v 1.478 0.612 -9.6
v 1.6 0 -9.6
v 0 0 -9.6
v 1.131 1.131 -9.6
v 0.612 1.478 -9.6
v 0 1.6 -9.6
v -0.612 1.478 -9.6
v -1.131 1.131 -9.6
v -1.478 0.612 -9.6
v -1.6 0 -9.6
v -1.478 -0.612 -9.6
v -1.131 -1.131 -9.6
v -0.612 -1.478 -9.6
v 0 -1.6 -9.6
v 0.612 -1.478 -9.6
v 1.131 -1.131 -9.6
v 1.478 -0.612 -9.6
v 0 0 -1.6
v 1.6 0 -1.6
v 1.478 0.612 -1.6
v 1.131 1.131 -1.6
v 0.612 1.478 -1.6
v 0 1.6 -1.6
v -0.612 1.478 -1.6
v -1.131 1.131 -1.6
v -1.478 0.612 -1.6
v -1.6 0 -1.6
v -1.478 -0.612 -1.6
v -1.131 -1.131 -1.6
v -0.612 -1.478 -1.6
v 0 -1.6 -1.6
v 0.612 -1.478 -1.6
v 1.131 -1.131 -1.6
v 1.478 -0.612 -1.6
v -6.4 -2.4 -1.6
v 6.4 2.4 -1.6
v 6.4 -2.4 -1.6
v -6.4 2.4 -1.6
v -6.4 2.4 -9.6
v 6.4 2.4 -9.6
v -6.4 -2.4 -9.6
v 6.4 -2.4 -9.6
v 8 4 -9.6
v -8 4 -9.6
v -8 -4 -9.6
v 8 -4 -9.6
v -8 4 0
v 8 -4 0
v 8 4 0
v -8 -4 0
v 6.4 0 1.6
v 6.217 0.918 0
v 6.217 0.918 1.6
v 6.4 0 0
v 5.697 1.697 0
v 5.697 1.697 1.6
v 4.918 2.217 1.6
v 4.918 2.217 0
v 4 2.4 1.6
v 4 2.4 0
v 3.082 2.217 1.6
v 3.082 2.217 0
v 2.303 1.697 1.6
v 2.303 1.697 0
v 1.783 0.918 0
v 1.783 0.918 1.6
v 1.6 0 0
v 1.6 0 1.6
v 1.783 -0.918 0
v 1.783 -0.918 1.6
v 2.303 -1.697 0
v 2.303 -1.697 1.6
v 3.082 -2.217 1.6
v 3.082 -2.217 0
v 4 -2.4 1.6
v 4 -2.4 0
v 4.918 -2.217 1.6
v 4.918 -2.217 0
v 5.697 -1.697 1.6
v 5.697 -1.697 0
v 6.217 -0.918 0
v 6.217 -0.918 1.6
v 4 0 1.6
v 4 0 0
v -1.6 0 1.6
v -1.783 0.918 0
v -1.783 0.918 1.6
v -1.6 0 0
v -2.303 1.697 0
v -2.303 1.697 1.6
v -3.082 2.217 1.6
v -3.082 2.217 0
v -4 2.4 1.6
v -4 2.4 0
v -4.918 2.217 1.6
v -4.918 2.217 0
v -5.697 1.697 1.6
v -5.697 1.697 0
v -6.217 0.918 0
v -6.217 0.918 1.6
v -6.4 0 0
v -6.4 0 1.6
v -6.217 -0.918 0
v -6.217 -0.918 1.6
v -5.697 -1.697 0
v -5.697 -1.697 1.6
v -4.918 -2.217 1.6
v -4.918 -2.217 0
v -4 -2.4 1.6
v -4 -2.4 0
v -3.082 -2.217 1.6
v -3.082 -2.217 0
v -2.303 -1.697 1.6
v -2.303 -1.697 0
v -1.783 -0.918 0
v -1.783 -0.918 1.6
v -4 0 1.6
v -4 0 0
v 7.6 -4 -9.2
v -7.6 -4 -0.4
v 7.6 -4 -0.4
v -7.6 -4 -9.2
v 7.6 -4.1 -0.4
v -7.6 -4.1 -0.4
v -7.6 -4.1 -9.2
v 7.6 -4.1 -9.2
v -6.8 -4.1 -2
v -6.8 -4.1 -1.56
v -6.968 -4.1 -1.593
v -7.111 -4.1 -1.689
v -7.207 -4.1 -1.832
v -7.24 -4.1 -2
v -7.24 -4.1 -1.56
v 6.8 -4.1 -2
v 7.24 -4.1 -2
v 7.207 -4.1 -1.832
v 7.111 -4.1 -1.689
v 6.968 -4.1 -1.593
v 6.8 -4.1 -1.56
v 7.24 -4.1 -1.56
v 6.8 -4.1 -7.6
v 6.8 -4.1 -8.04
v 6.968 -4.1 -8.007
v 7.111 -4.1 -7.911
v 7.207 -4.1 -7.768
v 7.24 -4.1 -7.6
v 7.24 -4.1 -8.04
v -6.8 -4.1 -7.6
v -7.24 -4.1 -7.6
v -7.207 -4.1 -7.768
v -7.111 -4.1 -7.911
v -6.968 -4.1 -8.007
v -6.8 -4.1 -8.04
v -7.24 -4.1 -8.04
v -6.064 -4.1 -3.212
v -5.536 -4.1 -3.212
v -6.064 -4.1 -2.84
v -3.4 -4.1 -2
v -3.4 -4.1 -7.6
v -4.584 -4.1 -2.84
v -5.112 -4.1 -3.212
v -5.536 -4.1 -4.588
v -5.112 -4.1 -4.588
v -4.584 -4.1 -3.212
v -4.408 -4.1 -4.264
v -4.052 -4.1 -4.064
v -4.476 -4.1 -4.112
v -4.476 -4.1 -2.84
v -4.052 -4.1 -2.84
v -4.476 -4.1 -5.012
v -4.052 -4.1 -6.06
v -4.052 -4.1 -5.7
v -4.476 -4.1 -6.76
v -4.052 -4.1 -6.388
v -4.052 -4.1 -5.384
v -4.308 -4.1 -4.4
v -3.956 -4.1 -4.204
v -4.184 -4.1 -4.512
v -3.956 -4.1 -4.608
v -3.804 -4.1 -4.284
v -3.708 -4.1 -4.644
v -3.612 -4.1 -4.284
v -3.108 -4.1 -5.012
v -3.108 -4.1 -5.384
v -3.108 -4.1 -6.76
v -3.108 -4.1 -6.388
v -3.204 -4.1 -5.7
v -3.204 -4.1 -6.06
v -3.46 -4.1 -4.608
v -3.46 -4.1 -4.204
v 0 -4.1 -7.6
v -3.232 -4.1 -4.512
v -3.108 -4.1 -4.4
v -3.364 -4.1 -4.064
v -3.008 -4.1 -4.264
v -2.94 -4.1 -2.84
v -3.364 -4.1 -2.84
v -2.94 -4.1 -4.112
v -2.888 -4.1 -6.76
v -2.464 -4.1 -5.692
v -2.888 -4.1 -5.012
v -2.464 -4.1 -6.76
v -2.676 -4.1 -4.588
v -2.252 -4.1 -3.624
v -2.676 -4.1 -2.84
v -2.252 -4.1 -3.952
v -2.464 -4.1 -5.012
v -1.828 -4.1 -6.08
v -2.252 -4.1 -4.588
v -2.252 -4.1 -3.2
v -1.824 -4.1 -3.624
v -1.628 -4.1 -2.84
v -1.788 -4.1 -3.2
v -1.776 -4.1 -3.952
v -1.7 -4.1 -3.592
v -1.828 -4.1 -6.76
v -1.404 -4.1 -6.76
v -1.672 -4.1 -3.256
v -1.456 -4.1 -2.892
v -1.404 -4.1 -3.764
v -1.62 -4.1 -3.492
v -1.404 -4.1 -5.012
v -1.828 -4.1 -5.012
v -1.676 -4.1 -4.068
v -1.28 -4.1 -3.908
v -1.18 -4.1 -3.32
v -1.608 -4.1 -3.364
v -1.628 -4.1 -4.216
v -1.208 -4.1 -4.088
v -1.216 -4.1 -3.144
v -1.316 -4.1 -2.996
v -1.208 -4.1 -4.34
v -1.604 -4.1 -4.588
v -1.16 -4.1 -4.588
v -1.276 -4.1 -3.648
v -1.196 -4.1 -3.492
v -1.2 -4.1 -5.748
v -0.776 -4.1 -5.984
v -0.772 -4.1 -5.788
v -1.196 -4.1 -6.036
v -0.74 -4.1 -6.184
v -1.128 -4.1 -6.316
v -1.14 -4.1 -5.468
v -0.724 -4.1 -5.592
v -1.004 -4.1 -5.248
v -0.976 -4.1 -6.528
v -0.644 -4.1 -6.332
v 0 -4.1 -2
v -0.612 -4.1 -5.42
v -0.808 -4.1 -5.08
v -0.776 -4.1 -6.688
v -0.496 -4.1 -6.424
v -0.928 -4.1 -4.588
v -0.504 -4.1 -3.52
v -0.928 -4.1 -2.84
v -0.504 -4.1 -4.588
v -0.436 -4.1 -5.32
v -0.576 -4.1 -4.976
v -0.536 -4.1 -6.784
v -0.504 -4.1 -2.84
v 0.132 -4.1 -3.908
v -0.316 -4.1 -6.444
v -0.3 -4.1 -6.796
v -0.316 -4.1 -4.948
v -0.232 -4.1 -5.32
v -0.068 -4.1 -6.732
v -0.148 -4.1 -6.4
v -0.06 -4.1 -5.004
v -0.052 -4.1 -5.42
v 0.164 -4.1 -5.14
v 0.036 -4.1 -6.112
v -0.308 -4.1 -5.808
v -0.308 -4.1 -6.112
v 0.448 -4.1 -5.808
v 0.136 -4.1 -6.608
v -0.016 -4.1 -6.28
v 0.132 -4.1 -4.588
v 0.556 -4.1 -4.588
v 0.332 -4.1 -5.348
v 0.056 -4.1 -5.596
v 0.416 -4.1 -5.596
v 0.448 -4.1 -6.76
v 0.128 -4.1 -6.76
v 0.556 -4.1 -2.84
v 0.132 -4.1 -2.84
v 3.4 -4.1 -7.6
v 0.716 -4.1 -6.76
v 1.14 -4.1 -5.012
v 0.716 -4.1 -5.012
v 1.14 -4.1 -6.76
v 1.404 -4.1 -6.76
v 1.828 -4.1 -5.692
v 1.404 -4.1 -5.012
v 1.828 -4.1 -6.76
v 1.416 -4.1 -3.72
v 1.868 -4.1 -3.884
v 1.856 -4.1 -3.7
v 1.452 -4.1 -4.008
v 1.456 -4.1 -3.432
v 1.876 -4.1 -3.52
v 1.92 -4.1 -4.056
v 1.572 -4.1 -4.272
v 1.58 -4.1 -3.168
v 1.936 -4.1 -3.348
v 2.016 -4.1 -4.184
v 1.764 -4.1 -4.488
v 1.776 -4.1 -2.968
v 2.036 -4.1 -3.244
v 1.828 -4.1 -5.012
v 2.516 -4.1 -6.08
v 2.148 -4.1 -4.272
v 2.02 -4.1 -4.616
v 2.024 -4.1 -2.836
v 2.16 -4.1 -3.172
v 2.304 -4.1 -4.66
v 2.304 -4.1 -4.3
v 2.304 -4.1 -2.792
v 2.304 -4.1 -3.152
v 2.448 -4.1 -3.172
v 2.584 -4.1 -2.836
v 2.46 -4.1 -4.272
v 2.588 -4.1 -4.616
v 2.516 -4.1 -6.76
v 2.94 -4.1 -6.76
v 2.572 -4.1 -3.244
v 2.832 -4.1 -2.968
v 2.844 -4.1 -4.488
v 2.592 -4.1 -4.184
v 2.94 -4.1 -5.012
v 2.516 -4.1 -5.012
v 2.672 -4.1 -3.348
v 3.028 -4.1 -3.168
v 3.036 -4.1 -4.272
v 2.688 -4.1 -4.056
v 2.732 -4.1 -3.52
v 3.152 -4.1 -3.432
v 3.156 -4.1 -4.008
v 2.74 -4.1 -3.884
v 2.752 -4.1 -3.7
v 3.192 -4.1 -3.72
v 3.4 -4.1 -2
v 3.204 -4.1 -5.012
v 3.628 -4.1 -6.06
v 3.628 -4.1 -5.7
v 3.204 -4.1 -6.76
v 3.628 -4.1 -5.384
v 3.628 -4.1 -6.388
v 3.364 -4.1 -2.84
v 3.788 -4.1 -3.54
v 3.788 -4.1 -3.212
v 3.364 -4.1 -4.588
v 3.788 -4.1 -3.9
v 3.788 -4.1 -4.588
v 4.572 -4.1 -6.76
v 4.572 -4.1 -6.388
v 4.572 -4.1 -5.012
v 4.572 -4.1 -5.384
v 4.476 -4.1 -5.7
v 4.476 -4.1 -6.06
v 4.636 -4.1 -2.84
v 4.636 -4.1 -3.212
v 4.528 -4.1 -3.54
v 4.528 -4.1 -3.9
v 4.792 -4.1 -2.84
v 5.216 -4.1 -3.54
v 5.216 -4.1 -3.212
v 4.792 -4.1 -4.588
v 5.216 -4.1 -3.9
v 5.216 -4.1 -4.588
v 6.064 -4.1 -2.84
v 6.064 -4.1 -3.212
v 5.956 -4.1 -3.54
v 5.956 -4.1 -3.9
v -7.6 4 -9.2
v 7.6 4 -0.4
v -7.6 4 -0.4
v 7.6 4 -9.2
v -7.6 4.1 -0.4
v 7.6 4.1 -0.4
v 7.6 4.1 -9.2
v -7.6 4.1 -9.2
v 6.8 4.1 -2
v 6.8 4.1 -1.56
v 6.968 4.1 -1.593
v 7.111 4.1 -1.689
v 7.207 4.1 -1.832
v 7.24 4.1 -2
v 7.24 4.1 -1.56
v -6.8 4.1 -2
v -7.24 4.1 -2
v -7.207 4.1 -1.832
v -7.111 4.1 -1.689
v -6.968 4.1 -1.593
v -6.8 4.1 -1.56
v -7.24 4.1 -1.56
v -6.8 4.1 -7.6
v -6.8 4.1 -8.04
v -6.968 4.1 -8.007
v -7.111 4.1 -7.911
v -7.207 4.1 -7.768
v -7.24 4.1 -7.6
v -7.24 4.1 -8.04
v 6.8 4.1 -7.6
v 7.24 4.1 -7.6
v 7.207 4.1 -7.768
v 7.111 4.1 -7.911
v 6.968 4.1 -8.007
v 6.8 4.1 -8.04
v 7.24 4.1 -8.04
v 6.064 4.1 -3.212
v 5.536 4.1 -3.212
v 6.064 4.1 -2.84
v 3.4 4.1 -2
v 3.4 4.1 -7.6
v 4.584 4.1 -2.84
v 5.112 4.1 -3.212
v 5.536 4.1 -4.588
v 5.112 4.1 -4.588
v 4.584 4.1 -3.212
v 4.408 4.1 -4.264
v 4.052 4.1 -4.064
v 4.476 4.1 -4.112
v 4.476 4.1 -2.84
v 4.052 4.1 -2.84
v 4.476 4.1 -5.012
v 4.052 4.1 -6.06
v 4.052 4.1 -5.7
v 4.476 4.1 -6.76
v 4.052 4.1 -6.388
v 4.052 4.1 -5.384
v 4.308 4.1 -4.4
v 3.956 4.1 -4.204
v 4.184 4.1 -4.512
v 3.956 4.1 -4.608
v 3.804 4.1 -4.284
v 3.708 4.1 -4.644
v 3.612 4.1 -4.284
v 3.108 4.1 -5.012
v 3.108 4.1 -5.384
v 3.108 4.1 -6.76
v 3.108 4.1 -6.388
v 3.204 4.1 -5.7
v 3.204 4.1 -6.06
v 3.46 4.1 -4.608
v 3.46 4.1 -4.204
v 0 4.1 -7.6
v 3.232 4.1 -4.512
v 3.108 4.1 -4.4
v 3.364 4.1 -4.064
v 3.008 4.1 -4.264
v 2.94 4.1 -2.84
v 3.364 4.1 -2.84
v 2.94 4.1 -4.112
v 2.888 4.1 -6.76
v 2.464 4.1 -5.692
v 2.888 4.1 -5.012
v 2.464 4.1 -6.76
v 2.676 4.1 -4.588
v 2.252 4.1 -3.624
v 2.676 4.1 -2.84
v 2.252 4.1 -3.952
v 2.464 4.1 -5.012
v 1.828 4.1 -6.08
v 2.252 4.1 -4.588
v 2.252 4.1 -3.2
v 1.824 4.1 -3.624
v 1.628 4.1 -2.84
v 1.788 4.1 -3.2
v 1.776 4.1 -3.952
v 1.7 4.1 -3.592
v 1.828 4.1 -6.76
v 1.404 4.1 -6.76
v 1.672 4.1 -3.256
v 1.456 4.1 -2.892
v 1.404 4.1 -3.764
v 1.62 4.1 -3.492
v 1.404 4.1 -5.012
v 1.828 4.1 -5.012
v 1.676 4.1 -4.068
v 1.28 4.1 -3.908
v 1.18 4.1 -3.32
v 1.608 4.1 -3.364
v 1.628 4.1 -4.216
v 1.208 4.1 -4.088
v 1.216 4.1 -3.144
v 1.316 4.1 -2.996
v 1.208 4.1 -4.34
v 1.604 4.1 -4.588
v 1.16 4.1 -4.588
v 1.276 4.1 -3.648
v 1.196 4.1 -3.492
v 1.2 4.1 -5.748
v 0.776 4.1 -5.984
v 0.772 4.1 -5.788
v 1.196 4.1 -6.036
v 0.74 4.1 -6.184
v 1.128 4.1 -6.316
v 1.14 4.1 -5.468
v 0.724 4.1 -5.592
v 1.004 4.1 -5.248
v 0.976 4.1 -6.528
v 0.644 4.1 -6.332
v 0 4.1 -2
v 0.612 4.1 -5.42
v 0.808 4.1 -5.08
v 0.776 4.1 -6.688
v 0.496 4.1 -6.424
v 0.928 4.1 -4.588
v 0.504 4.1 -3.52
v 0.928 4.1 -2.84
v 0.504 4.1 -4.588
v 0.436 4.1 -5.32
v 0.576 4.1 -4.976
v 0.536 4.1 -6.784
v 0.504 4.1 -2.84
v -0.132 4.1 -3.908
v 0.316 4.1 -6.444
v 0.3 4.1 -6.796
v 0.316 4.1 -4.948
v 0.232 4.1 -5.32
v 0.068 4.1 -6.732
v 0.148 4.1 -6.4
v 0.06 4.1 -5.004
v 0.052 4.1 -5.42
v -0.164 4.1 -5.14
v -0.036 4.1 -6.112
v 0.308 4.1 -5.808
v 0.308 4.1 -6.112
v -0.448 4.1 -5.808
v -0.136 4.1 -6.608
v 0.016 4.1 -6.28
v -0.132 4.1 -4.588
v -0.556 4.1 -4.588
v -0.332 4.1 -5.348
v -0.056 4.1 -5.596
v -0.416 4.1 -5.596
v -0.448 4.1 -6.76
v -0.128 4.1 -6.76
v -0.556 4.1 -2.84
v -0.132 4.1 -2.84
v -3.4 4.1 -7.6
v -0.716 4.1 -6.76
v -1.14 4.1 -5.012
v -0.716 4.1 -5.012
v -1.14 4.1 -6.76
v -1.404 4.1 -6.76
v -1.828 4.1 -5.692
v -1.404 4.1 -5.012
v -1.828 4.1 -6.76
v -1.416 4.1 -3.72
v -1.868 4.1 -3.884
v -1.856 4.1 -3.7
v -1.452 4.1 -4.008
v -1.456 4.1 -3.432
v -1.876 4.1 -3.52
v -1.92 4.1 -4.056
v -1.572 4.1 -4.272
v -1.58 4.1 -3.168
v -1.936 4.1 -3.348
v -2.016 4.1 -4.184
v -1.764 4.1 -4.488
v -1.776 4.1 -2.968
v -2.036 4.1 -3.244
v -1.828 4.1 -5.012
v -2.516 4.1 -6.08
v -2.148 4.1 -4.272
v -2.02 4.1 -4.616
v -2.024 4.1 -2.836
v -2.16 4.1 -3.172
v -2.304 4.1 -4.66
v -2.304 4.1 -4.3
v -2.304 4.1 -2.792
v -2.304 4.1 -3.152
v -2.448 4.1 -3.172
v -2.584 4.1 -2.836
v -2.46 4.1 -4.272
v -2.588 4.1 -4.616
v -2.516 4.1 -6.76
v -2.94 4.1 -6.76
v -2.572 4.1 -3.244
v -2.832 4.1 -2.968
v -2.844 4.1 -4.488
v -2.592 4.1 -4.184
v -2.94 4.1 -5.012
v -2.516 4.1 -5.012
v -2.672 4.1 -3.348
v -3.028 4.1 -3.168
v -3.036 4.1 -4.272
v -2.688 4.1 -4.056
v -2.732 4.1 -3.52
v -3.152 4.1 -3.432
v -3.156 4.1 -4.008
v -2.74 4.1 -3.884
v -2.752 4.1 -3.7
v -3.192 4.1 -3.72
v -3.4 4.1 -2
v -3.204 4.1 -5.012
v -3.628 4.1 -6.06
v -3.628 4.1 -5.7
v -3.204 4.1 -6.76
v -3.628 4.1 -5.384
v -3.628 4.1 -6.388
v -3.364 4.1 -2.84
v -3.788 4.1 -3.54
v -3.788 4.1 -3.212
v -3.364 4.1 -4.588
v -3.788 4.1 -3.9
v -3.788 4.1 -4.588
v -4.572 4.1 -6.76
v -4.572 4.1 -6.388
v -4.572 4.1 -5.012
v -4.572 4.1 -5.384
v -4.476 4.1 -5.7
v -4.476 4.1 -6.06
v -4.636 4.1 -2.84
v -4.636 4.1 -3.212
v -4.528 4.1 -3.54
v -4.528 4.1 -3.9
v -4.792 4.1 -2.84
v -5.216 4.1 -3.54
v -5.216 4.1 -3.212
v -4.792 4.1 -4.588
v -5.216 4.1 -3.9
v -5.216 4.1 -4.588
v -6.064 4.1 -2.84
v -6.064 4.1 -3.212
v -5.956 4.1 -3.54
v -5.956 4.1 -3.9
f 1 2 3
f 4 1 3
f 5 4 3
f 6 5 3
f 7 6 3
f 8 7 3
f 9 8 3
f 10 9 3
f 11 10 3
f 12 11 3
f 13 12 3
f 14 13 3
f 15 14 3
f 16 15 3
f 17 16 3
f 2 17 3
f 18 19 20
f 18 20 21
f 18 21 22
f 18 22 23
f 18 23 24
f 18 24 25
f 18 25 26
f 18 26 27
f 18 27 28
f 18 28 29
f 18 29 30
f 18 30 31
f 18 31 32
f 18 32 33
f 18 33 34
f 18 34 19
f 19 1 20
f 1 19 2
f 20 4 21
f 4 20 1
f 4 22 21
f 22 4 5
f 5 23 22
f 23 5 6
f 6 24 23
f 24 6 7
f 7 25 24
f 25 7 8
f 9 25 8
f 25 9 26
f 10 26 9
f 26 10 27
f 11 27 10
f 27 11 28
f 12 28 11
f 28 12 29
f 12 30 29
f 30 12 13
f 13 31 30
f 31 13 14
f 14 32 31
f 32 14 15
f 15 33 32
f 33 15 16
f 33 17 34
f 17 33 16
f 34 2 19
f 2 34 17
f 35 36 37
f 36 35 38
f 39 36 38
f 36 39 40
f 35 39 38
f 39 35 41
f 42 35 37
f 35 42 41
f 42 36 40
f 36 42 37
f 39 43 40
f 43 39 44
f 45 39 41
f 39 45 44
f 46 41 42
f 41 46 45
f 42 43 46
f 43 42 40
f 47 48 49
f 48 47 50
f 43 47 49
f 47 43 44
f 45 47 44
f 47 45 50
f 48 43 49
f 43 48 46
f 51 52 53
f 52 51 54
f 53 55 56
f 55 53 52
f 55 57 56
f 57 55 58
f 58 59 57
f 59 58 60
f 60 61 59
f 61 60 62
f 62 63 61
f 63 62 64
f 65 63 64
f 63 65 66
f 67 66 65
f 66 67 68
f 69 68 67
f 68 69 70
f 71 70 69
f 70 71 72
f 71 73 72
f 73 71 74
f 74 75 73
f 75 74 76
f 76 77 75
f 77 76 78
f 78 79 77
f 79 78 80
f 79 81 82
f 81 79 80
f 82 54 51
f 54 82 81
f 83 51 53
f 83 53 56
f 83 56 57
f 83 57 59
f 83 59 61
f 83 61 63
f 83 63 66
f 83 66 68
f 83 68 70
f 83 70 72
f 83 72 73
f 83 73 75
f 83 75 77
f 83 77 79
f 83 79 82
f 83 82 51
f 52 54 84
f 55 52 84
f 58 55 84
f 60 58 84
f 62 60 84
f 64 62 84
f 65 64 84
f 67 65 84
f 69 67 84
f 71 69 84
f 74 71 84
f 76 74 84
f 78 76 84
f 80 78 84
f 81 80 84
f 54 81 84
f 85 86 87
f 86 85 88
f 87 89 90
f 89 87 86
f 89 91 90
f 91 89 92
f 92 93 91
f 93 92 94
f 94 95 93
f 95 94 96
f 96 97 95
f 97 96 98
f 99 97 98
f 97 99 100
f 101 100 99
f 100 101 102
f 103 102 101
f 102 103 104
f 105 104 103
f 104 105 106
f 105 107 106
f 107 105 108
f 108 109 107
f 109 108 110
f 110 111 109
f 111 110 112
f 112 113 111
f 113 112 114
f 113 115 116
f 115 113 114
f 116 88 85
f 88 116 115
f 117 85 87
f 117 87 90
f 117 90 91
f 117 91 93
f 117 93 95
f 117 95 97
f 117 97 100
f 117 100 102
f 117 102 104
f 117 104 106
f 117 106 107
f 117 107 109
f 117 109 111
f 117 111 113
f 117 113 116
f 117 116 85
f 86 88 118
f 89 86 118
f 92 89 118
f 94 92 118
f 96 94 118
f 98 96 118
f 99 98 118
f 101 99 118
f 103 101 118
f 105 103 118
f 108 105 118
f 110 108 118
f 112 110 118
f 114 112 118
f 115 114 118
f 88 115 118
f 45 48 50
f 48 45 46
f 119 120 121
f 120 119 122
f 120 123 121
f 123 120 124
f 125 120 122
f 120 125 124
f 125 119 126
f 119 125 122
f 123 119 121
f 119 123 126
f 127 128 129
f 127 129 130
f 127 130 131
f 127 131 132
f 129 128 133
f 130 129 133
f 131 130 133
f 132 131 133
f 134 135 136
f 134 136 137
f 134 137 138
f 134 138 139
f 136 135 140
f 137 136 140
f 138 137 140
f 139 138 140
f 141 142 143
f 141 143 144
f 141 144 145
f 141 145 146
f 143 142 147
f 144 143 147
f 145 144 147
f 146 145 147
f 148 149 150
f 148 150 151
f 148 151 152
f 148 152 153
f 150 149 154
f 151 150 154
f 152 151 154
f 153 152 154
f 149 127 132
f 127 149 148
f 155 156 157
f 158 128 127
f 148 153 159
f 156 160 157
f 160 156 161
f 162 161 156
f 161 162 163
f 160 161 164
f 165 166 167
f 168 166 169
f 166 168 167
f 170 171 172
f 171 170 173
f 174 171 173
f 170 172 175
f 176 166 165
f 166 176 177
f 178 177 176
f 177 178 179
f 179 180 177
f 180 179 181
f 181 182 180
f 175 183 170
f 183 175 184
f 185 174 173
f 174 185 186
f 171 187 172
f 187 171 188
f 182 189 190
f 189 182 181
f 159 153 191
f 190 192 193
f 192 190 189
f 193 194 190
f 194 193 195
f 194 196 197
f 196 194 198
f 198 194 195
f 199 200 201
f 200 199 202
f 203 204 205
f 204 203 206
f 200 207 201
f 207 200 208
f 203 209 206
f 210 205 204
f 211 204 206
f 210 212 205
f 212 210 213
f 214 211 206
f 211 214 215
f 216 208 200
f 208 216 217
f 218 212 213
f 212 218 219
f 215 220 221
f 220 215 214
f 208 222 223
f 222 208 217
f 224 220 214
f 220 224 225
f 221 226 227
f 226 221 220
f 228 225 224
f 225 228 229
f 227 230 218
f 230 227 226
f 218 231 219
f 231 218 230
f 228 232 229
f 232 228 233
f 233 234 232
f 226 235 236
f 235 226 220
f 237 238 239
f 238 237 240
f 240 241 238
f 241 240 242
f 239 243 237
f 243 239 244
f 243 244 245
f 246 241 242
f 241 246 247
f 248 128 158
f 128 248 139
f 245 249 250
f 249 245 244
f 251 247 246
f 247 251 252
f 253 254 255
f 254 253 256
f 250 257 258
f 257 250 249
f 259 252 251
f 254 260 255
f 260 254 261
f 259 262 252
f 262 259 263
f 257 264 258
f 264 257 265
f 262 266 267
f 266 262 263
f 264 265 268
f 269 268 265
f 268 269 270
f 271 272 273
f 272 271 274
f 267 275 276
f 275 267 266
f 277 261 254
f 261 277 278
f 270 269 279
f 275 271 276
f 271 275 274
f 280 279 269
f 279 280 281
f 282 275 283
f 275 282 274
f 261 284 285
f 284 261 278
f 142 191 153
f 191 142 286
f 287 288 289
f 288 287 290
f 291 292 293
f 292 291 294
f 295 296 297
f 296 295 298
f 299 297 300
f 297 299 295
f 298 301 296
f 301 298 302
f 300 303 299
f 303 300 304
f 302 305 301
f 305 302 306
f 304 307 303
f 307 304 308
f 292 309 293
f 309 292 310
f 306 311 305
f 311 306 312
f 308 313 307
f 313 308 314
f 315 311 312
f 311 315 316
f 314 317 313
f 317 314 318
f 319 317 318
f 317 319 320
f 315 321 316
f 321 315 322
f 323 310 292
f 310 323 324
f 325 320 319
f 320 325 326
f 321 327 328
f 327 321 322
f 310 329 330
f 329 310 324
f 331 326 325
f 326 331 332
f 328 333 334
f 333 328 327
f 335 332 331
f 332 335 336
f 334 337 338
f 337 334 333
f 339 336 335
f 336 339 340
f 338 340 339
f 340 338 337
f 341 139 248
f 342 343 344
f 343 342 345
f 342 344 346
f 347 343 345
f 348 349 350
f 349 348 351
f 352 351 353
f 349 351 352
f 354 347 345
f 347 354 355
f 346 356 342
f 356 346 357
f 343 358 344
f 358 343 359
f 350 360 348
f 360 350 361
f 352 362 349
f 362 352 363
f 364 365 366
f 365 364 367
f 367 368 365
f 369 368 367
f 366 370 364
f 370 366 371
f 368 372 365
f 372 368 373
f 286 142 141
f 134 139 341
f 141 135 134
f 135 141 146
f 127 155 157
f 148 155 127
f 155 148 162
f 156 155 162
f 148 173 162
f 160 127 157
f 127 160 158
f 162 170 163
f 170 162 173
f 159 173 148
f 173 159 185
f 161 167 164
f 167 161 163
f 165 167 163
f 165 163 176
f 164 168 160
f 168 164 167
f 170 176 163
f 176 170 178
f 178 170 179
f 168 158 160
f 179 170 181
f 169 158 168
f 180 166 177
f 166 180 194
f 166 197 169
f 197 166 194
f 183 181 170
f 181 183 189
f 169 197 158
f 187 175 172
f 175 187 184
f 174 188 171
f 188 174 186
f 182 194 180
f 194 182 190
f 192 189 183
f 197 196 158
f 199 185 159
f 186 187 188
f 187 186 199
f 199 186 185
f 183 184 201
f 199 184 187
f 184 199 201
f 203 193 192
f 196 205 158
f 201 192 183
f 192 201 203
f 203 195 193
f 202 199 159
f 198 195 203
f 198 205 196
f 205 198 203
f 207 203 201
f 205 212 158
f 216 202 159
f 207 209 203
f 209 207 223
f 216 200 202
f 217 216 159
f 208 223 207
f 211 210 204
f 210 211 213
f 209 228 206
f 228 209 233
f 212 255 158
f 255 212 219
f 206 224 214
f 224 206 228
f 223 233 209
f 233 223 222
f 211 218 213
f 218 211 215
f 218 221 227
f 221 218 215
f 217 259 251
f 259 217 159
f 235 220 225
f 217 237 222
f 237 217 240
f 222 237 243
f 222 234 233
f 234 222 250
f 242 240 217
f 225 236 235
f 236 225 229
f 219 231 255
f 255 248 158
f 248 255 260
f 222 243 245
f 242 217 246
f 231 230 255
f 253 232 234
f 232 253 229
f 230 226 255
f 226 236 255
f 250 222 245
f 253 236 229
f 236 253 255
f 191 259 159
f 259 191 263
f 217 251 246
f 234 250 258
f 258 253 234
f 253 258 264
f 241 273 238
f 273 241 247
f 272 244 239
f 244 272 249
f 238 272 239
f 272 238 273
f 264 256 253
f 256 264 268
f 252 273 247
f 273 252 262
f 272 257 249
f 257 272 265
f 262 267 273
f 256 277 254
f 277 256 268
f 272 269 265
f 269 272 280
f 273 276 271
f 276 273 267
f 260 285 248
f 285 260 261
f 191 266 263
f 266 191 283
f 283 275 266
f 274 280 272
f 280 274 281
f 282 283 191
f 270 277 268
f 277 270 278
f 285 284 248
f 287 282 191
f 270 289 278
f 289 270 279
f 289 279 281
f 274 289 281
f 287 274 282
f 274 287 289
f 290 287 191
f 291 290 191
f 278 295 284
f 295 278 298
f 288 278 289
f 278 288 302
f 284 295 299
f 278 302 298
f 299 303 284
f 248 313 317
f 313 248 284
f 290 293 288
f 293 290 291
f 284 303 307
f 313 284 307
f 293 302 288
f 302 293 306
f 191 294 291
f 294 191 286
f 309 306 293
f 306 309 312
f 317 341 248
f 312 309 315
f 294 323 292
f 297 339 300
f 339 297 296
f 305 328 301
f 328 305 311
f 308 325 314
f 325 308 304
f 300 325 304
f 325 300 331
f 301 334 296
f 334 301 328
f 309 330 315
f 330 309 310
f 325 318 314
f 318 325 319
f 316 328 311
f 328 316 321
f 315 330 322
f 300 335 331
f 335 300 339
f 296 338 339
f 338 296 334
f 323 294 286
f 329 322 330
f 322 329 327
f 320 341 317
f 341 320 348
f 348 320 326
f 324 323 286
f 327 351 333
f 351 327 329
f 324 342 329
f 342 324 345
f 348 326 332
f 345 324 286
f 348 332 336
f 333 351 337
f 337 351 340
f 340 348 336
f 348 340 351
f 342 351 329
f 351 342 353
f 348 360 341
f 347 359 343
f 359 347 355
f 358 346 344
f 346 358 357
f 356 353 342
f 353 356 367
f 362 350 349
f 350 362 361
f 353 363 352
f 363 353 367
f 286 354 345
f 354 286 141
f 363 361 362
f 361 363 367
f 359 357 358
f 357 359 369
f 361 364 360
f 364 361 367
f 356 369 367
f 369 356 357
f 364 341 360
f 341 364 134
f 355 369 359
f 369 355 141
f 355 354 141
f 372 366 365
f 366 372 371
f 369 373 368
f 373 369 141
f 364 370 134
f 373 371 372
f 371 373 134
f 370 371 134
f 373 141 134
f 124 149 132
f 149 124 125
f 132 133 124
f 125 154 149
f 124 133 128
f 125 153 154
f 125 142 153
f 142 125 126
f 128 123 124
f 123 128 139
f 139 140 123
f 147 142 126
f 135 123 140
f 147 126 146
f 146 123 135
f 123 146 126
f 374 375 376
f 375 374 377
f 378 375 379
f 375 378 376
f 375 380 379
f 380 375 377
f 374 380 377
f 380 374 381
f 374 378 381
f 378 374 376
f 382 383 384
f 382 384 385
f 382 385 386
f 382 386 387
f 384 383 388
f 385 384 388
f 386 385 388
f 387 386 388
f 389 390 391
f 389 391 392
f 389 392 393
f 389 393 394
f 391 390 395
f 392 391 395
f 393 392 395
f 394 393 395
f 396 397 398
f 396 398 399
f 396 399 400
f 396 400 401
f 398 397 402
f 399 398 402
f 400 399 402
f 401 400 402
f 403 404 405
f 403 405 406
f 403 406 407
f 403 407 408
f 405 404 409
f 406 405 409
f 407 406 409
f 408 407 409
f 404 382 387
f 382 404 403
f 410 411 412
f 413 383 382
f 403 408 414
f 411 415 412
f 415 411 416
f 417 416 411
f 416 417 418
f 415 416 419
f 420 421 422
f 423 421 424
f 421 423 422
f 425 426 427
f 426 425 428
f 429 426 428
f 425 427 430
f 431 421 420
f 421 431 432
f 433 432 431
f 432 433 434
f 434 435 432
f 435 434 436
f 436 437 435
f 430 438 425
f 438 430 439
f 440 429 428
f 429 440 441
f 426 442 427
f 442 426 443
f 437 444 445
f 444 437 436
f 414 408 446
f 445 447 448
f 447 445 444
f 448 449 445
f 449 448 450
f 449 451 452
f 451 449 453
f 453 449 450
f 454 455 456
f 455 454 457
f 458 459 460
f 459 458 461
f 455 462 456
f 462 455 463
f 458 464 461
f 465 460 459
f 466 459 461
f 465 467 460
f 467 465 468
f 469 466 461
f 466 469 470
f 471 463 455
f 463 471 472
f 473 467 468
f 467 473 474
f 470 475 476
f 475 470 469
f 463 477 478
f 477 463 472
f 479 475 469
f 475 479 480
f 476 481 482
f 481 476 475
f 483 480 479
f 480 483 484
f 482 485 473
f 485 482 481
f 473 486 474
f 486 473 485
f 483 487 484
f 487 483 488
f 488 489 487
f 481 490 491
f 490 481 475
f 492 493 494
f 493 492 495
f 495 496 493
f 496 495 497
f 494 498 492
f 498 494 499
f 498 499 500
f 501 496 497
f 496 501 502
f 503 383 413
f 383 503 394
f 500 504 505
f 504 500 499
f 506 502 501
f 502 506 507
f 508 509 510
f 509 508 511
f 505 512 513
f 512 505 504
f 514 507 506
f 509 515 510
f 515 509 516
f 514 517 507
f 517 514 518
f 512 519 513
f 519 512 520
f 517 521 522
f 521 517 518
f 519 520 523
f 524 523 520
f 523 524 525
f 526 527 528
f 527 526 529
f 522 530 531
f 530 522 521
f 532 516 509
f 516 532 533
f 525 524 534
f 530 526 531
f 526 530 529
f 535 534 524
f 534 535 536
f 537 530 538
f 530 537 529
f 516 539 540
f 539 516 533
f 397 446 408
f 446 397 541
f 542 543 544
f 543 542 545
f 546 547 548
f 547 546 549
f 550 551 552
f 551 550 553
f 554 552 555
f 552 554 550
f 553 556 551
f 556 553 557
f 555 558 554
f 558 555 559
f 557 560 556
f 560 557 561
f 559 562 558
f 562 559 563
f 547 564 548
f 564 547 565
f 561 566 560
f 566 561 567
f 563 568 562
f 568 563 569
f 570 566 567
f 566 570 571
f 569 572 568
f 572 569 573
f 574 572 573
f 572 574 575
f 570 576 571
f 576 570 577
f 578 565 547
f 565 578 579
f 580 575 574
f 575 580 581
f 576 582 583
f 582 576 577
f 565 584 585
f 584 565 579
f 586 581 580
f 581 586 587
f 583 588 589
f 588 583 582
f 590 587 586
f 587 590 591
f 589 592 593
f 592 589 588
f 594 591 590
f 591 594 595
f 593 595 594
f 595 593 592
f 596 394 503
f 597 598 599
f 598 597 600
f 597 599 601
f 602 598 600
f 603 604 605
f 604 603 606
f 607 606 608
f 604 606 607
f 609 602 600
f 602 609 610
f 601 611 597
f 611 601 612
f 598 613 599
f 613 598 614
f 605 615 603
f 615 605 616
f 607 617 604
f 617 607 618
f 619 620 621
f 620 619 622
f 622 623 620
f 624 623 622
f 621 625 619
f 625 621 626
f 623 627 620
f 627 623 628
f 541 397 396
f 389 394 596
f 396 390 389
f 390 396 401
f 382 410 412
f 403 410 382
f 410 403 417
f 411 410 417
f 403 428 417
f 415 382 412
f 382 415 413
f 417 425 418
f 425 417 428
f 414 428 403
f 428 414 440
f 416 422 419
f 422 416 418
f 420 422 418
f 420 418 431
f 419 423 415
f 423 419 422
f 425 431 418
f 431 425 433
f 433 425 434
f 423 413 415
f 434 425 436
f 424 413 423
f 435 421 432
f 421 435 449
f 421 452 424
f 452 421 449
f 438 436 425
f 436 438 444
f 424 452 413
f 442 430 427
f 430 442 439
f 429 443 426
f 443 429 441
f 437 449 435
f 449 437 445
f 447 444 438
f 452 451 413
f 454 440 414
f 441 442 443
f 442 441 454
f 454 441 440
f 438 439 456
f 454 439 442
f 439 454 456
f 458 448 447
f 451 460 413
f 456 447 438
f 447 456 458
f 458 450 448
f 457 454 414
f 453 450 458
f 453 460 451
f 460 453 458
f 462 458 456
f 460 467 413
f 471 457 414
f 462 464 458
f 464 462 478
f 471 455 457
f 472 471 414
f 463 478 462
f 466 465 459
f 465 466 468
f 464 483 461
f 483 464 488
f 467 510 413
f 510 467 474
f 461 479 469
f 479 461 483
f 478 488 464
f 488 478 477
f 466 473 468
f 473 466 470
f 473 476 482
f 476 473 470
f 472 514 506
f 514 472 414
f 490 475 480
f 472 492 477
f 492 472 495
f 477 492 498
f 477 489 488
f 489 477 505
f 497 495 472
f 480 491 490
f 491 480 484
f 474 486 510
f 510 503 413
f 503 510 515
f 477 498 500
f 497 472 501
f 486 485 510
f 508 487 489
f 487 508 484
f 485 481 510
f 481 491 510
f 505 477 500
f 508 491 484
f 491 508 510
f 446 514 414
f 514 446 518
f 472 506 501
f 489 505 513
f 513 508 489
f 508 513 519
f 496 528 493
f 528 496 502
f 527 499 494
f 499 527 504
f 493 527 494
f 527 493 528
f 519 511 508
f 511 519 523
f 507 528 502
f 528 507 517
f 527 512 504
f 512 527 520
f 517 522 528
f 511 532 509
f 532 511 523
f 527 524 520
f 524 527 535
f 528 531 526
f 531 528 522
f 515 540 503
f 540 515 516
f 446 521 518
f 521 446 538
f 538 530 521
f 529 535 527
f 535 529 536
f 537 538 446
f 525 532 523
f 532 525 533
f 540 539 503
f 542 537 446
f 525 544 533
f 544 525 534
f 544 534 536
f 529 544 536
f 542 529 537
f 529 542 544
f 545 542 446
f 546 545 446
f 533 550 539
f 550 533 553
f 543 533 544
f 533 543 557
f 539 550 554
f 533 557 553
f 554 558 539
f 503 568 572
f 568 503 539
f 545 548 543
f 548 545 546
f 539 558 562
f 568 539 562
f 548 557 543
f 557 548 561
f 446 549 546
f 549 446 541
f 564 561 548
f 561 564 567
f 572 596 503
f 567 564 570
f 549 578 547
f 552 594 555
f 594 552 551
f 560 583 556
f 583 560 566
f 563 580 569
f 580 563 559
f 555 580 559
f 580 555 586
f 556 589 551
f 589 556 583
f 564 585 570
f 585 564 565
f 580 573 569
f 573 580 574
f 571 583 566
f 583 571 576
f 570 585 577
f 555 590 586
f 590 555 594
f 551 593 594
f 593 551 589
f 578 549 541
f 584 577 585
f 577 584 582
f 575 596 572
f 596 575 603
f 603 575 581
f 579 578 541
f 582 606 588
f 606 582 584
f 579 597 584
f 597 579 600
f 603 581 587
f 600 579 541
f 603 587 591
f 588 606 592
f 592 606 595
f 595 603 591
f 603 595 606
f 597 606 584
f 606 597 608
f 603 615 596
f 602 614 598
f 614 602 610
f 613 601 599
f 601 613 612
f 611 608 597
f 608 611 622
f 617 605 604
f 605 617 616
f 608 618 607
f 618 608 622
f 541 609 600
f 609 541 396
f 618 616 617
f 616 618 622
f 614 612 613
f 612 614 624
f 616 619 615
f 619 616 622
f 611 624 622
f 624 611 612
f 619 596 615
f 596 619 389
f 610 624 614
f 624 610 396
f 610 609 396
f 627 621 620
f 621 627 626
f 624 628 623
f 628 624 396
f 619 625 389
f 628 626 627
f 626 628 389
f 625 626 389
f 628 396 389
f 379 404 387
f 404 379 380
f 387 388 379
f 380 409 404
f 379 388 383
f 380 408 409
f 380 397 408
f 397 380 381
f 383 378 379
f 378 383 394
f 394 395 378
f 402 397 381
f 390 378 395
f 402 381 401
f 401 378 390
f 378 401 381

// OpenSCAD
use <../lib.scad>
use <192375g.scad>
use <3004.scad>
function ldraw_lib__3004d0h() = [
// 0 Brick  1 x  2 with "TURN OFF ENGINE" Sticker on Both Sides
// 0 Name: 3004d0h.dat
// 0 Author: Takeshi Takahashi [RainbowDolphin]
// 0 !LDRAW_ORG Shortcut UPDATE 2024-05
// 0 !LICENSE Licensed under CC BY 4.0 : see CAreadme.txt
// 
// 0 BFC CERTIFY CCW
  [0,"BFC","CERTIFY"],
  [0,"BFC","CCW"],
// 
// 0 !CATEGORY Sticker Shortcut
// 0 !KEYWORDS Bricklink 3004pb062, Gas Station, Set 6375-2
// 
// 0 !HISTORY 2024-06-30 [OrionP] Official Update 2024-05
// 
// 1 16 0 0 0 1 0 0 0 1 0 0 0 1 3004.dat
  [1,16,0,0,0,1,0,0,0,1,0,0,0,1, ldraw_lib__3004()],
// 1 16 0 12 -10 1 0 0 0 0 -1 0 1 0 192375g.dat
  [1,16,0,12,-10,1,0,0,0,0,-1,0,1,0, ldraw_lib__192375g()],
// 1 16 0 12 10 -1 0 0 0 0 -1 0 -1 0 192375g.dat
  [1,16,0,12,10,-1,0,0,0,0,-1,0,-1,0, ldraw_lib__192375g()],
];
module ldraw_lib__3004d0h(step=0, col=false, unit=2/5, alt=false, line=0.2, solid=!$preview)
    makepoly(ldraw_lib__3004d0h(), step=step, col=col, unit=unit, alt=alt, line=line, solid=solid);
ldraw_lib__3004d0h(line=0.2);
